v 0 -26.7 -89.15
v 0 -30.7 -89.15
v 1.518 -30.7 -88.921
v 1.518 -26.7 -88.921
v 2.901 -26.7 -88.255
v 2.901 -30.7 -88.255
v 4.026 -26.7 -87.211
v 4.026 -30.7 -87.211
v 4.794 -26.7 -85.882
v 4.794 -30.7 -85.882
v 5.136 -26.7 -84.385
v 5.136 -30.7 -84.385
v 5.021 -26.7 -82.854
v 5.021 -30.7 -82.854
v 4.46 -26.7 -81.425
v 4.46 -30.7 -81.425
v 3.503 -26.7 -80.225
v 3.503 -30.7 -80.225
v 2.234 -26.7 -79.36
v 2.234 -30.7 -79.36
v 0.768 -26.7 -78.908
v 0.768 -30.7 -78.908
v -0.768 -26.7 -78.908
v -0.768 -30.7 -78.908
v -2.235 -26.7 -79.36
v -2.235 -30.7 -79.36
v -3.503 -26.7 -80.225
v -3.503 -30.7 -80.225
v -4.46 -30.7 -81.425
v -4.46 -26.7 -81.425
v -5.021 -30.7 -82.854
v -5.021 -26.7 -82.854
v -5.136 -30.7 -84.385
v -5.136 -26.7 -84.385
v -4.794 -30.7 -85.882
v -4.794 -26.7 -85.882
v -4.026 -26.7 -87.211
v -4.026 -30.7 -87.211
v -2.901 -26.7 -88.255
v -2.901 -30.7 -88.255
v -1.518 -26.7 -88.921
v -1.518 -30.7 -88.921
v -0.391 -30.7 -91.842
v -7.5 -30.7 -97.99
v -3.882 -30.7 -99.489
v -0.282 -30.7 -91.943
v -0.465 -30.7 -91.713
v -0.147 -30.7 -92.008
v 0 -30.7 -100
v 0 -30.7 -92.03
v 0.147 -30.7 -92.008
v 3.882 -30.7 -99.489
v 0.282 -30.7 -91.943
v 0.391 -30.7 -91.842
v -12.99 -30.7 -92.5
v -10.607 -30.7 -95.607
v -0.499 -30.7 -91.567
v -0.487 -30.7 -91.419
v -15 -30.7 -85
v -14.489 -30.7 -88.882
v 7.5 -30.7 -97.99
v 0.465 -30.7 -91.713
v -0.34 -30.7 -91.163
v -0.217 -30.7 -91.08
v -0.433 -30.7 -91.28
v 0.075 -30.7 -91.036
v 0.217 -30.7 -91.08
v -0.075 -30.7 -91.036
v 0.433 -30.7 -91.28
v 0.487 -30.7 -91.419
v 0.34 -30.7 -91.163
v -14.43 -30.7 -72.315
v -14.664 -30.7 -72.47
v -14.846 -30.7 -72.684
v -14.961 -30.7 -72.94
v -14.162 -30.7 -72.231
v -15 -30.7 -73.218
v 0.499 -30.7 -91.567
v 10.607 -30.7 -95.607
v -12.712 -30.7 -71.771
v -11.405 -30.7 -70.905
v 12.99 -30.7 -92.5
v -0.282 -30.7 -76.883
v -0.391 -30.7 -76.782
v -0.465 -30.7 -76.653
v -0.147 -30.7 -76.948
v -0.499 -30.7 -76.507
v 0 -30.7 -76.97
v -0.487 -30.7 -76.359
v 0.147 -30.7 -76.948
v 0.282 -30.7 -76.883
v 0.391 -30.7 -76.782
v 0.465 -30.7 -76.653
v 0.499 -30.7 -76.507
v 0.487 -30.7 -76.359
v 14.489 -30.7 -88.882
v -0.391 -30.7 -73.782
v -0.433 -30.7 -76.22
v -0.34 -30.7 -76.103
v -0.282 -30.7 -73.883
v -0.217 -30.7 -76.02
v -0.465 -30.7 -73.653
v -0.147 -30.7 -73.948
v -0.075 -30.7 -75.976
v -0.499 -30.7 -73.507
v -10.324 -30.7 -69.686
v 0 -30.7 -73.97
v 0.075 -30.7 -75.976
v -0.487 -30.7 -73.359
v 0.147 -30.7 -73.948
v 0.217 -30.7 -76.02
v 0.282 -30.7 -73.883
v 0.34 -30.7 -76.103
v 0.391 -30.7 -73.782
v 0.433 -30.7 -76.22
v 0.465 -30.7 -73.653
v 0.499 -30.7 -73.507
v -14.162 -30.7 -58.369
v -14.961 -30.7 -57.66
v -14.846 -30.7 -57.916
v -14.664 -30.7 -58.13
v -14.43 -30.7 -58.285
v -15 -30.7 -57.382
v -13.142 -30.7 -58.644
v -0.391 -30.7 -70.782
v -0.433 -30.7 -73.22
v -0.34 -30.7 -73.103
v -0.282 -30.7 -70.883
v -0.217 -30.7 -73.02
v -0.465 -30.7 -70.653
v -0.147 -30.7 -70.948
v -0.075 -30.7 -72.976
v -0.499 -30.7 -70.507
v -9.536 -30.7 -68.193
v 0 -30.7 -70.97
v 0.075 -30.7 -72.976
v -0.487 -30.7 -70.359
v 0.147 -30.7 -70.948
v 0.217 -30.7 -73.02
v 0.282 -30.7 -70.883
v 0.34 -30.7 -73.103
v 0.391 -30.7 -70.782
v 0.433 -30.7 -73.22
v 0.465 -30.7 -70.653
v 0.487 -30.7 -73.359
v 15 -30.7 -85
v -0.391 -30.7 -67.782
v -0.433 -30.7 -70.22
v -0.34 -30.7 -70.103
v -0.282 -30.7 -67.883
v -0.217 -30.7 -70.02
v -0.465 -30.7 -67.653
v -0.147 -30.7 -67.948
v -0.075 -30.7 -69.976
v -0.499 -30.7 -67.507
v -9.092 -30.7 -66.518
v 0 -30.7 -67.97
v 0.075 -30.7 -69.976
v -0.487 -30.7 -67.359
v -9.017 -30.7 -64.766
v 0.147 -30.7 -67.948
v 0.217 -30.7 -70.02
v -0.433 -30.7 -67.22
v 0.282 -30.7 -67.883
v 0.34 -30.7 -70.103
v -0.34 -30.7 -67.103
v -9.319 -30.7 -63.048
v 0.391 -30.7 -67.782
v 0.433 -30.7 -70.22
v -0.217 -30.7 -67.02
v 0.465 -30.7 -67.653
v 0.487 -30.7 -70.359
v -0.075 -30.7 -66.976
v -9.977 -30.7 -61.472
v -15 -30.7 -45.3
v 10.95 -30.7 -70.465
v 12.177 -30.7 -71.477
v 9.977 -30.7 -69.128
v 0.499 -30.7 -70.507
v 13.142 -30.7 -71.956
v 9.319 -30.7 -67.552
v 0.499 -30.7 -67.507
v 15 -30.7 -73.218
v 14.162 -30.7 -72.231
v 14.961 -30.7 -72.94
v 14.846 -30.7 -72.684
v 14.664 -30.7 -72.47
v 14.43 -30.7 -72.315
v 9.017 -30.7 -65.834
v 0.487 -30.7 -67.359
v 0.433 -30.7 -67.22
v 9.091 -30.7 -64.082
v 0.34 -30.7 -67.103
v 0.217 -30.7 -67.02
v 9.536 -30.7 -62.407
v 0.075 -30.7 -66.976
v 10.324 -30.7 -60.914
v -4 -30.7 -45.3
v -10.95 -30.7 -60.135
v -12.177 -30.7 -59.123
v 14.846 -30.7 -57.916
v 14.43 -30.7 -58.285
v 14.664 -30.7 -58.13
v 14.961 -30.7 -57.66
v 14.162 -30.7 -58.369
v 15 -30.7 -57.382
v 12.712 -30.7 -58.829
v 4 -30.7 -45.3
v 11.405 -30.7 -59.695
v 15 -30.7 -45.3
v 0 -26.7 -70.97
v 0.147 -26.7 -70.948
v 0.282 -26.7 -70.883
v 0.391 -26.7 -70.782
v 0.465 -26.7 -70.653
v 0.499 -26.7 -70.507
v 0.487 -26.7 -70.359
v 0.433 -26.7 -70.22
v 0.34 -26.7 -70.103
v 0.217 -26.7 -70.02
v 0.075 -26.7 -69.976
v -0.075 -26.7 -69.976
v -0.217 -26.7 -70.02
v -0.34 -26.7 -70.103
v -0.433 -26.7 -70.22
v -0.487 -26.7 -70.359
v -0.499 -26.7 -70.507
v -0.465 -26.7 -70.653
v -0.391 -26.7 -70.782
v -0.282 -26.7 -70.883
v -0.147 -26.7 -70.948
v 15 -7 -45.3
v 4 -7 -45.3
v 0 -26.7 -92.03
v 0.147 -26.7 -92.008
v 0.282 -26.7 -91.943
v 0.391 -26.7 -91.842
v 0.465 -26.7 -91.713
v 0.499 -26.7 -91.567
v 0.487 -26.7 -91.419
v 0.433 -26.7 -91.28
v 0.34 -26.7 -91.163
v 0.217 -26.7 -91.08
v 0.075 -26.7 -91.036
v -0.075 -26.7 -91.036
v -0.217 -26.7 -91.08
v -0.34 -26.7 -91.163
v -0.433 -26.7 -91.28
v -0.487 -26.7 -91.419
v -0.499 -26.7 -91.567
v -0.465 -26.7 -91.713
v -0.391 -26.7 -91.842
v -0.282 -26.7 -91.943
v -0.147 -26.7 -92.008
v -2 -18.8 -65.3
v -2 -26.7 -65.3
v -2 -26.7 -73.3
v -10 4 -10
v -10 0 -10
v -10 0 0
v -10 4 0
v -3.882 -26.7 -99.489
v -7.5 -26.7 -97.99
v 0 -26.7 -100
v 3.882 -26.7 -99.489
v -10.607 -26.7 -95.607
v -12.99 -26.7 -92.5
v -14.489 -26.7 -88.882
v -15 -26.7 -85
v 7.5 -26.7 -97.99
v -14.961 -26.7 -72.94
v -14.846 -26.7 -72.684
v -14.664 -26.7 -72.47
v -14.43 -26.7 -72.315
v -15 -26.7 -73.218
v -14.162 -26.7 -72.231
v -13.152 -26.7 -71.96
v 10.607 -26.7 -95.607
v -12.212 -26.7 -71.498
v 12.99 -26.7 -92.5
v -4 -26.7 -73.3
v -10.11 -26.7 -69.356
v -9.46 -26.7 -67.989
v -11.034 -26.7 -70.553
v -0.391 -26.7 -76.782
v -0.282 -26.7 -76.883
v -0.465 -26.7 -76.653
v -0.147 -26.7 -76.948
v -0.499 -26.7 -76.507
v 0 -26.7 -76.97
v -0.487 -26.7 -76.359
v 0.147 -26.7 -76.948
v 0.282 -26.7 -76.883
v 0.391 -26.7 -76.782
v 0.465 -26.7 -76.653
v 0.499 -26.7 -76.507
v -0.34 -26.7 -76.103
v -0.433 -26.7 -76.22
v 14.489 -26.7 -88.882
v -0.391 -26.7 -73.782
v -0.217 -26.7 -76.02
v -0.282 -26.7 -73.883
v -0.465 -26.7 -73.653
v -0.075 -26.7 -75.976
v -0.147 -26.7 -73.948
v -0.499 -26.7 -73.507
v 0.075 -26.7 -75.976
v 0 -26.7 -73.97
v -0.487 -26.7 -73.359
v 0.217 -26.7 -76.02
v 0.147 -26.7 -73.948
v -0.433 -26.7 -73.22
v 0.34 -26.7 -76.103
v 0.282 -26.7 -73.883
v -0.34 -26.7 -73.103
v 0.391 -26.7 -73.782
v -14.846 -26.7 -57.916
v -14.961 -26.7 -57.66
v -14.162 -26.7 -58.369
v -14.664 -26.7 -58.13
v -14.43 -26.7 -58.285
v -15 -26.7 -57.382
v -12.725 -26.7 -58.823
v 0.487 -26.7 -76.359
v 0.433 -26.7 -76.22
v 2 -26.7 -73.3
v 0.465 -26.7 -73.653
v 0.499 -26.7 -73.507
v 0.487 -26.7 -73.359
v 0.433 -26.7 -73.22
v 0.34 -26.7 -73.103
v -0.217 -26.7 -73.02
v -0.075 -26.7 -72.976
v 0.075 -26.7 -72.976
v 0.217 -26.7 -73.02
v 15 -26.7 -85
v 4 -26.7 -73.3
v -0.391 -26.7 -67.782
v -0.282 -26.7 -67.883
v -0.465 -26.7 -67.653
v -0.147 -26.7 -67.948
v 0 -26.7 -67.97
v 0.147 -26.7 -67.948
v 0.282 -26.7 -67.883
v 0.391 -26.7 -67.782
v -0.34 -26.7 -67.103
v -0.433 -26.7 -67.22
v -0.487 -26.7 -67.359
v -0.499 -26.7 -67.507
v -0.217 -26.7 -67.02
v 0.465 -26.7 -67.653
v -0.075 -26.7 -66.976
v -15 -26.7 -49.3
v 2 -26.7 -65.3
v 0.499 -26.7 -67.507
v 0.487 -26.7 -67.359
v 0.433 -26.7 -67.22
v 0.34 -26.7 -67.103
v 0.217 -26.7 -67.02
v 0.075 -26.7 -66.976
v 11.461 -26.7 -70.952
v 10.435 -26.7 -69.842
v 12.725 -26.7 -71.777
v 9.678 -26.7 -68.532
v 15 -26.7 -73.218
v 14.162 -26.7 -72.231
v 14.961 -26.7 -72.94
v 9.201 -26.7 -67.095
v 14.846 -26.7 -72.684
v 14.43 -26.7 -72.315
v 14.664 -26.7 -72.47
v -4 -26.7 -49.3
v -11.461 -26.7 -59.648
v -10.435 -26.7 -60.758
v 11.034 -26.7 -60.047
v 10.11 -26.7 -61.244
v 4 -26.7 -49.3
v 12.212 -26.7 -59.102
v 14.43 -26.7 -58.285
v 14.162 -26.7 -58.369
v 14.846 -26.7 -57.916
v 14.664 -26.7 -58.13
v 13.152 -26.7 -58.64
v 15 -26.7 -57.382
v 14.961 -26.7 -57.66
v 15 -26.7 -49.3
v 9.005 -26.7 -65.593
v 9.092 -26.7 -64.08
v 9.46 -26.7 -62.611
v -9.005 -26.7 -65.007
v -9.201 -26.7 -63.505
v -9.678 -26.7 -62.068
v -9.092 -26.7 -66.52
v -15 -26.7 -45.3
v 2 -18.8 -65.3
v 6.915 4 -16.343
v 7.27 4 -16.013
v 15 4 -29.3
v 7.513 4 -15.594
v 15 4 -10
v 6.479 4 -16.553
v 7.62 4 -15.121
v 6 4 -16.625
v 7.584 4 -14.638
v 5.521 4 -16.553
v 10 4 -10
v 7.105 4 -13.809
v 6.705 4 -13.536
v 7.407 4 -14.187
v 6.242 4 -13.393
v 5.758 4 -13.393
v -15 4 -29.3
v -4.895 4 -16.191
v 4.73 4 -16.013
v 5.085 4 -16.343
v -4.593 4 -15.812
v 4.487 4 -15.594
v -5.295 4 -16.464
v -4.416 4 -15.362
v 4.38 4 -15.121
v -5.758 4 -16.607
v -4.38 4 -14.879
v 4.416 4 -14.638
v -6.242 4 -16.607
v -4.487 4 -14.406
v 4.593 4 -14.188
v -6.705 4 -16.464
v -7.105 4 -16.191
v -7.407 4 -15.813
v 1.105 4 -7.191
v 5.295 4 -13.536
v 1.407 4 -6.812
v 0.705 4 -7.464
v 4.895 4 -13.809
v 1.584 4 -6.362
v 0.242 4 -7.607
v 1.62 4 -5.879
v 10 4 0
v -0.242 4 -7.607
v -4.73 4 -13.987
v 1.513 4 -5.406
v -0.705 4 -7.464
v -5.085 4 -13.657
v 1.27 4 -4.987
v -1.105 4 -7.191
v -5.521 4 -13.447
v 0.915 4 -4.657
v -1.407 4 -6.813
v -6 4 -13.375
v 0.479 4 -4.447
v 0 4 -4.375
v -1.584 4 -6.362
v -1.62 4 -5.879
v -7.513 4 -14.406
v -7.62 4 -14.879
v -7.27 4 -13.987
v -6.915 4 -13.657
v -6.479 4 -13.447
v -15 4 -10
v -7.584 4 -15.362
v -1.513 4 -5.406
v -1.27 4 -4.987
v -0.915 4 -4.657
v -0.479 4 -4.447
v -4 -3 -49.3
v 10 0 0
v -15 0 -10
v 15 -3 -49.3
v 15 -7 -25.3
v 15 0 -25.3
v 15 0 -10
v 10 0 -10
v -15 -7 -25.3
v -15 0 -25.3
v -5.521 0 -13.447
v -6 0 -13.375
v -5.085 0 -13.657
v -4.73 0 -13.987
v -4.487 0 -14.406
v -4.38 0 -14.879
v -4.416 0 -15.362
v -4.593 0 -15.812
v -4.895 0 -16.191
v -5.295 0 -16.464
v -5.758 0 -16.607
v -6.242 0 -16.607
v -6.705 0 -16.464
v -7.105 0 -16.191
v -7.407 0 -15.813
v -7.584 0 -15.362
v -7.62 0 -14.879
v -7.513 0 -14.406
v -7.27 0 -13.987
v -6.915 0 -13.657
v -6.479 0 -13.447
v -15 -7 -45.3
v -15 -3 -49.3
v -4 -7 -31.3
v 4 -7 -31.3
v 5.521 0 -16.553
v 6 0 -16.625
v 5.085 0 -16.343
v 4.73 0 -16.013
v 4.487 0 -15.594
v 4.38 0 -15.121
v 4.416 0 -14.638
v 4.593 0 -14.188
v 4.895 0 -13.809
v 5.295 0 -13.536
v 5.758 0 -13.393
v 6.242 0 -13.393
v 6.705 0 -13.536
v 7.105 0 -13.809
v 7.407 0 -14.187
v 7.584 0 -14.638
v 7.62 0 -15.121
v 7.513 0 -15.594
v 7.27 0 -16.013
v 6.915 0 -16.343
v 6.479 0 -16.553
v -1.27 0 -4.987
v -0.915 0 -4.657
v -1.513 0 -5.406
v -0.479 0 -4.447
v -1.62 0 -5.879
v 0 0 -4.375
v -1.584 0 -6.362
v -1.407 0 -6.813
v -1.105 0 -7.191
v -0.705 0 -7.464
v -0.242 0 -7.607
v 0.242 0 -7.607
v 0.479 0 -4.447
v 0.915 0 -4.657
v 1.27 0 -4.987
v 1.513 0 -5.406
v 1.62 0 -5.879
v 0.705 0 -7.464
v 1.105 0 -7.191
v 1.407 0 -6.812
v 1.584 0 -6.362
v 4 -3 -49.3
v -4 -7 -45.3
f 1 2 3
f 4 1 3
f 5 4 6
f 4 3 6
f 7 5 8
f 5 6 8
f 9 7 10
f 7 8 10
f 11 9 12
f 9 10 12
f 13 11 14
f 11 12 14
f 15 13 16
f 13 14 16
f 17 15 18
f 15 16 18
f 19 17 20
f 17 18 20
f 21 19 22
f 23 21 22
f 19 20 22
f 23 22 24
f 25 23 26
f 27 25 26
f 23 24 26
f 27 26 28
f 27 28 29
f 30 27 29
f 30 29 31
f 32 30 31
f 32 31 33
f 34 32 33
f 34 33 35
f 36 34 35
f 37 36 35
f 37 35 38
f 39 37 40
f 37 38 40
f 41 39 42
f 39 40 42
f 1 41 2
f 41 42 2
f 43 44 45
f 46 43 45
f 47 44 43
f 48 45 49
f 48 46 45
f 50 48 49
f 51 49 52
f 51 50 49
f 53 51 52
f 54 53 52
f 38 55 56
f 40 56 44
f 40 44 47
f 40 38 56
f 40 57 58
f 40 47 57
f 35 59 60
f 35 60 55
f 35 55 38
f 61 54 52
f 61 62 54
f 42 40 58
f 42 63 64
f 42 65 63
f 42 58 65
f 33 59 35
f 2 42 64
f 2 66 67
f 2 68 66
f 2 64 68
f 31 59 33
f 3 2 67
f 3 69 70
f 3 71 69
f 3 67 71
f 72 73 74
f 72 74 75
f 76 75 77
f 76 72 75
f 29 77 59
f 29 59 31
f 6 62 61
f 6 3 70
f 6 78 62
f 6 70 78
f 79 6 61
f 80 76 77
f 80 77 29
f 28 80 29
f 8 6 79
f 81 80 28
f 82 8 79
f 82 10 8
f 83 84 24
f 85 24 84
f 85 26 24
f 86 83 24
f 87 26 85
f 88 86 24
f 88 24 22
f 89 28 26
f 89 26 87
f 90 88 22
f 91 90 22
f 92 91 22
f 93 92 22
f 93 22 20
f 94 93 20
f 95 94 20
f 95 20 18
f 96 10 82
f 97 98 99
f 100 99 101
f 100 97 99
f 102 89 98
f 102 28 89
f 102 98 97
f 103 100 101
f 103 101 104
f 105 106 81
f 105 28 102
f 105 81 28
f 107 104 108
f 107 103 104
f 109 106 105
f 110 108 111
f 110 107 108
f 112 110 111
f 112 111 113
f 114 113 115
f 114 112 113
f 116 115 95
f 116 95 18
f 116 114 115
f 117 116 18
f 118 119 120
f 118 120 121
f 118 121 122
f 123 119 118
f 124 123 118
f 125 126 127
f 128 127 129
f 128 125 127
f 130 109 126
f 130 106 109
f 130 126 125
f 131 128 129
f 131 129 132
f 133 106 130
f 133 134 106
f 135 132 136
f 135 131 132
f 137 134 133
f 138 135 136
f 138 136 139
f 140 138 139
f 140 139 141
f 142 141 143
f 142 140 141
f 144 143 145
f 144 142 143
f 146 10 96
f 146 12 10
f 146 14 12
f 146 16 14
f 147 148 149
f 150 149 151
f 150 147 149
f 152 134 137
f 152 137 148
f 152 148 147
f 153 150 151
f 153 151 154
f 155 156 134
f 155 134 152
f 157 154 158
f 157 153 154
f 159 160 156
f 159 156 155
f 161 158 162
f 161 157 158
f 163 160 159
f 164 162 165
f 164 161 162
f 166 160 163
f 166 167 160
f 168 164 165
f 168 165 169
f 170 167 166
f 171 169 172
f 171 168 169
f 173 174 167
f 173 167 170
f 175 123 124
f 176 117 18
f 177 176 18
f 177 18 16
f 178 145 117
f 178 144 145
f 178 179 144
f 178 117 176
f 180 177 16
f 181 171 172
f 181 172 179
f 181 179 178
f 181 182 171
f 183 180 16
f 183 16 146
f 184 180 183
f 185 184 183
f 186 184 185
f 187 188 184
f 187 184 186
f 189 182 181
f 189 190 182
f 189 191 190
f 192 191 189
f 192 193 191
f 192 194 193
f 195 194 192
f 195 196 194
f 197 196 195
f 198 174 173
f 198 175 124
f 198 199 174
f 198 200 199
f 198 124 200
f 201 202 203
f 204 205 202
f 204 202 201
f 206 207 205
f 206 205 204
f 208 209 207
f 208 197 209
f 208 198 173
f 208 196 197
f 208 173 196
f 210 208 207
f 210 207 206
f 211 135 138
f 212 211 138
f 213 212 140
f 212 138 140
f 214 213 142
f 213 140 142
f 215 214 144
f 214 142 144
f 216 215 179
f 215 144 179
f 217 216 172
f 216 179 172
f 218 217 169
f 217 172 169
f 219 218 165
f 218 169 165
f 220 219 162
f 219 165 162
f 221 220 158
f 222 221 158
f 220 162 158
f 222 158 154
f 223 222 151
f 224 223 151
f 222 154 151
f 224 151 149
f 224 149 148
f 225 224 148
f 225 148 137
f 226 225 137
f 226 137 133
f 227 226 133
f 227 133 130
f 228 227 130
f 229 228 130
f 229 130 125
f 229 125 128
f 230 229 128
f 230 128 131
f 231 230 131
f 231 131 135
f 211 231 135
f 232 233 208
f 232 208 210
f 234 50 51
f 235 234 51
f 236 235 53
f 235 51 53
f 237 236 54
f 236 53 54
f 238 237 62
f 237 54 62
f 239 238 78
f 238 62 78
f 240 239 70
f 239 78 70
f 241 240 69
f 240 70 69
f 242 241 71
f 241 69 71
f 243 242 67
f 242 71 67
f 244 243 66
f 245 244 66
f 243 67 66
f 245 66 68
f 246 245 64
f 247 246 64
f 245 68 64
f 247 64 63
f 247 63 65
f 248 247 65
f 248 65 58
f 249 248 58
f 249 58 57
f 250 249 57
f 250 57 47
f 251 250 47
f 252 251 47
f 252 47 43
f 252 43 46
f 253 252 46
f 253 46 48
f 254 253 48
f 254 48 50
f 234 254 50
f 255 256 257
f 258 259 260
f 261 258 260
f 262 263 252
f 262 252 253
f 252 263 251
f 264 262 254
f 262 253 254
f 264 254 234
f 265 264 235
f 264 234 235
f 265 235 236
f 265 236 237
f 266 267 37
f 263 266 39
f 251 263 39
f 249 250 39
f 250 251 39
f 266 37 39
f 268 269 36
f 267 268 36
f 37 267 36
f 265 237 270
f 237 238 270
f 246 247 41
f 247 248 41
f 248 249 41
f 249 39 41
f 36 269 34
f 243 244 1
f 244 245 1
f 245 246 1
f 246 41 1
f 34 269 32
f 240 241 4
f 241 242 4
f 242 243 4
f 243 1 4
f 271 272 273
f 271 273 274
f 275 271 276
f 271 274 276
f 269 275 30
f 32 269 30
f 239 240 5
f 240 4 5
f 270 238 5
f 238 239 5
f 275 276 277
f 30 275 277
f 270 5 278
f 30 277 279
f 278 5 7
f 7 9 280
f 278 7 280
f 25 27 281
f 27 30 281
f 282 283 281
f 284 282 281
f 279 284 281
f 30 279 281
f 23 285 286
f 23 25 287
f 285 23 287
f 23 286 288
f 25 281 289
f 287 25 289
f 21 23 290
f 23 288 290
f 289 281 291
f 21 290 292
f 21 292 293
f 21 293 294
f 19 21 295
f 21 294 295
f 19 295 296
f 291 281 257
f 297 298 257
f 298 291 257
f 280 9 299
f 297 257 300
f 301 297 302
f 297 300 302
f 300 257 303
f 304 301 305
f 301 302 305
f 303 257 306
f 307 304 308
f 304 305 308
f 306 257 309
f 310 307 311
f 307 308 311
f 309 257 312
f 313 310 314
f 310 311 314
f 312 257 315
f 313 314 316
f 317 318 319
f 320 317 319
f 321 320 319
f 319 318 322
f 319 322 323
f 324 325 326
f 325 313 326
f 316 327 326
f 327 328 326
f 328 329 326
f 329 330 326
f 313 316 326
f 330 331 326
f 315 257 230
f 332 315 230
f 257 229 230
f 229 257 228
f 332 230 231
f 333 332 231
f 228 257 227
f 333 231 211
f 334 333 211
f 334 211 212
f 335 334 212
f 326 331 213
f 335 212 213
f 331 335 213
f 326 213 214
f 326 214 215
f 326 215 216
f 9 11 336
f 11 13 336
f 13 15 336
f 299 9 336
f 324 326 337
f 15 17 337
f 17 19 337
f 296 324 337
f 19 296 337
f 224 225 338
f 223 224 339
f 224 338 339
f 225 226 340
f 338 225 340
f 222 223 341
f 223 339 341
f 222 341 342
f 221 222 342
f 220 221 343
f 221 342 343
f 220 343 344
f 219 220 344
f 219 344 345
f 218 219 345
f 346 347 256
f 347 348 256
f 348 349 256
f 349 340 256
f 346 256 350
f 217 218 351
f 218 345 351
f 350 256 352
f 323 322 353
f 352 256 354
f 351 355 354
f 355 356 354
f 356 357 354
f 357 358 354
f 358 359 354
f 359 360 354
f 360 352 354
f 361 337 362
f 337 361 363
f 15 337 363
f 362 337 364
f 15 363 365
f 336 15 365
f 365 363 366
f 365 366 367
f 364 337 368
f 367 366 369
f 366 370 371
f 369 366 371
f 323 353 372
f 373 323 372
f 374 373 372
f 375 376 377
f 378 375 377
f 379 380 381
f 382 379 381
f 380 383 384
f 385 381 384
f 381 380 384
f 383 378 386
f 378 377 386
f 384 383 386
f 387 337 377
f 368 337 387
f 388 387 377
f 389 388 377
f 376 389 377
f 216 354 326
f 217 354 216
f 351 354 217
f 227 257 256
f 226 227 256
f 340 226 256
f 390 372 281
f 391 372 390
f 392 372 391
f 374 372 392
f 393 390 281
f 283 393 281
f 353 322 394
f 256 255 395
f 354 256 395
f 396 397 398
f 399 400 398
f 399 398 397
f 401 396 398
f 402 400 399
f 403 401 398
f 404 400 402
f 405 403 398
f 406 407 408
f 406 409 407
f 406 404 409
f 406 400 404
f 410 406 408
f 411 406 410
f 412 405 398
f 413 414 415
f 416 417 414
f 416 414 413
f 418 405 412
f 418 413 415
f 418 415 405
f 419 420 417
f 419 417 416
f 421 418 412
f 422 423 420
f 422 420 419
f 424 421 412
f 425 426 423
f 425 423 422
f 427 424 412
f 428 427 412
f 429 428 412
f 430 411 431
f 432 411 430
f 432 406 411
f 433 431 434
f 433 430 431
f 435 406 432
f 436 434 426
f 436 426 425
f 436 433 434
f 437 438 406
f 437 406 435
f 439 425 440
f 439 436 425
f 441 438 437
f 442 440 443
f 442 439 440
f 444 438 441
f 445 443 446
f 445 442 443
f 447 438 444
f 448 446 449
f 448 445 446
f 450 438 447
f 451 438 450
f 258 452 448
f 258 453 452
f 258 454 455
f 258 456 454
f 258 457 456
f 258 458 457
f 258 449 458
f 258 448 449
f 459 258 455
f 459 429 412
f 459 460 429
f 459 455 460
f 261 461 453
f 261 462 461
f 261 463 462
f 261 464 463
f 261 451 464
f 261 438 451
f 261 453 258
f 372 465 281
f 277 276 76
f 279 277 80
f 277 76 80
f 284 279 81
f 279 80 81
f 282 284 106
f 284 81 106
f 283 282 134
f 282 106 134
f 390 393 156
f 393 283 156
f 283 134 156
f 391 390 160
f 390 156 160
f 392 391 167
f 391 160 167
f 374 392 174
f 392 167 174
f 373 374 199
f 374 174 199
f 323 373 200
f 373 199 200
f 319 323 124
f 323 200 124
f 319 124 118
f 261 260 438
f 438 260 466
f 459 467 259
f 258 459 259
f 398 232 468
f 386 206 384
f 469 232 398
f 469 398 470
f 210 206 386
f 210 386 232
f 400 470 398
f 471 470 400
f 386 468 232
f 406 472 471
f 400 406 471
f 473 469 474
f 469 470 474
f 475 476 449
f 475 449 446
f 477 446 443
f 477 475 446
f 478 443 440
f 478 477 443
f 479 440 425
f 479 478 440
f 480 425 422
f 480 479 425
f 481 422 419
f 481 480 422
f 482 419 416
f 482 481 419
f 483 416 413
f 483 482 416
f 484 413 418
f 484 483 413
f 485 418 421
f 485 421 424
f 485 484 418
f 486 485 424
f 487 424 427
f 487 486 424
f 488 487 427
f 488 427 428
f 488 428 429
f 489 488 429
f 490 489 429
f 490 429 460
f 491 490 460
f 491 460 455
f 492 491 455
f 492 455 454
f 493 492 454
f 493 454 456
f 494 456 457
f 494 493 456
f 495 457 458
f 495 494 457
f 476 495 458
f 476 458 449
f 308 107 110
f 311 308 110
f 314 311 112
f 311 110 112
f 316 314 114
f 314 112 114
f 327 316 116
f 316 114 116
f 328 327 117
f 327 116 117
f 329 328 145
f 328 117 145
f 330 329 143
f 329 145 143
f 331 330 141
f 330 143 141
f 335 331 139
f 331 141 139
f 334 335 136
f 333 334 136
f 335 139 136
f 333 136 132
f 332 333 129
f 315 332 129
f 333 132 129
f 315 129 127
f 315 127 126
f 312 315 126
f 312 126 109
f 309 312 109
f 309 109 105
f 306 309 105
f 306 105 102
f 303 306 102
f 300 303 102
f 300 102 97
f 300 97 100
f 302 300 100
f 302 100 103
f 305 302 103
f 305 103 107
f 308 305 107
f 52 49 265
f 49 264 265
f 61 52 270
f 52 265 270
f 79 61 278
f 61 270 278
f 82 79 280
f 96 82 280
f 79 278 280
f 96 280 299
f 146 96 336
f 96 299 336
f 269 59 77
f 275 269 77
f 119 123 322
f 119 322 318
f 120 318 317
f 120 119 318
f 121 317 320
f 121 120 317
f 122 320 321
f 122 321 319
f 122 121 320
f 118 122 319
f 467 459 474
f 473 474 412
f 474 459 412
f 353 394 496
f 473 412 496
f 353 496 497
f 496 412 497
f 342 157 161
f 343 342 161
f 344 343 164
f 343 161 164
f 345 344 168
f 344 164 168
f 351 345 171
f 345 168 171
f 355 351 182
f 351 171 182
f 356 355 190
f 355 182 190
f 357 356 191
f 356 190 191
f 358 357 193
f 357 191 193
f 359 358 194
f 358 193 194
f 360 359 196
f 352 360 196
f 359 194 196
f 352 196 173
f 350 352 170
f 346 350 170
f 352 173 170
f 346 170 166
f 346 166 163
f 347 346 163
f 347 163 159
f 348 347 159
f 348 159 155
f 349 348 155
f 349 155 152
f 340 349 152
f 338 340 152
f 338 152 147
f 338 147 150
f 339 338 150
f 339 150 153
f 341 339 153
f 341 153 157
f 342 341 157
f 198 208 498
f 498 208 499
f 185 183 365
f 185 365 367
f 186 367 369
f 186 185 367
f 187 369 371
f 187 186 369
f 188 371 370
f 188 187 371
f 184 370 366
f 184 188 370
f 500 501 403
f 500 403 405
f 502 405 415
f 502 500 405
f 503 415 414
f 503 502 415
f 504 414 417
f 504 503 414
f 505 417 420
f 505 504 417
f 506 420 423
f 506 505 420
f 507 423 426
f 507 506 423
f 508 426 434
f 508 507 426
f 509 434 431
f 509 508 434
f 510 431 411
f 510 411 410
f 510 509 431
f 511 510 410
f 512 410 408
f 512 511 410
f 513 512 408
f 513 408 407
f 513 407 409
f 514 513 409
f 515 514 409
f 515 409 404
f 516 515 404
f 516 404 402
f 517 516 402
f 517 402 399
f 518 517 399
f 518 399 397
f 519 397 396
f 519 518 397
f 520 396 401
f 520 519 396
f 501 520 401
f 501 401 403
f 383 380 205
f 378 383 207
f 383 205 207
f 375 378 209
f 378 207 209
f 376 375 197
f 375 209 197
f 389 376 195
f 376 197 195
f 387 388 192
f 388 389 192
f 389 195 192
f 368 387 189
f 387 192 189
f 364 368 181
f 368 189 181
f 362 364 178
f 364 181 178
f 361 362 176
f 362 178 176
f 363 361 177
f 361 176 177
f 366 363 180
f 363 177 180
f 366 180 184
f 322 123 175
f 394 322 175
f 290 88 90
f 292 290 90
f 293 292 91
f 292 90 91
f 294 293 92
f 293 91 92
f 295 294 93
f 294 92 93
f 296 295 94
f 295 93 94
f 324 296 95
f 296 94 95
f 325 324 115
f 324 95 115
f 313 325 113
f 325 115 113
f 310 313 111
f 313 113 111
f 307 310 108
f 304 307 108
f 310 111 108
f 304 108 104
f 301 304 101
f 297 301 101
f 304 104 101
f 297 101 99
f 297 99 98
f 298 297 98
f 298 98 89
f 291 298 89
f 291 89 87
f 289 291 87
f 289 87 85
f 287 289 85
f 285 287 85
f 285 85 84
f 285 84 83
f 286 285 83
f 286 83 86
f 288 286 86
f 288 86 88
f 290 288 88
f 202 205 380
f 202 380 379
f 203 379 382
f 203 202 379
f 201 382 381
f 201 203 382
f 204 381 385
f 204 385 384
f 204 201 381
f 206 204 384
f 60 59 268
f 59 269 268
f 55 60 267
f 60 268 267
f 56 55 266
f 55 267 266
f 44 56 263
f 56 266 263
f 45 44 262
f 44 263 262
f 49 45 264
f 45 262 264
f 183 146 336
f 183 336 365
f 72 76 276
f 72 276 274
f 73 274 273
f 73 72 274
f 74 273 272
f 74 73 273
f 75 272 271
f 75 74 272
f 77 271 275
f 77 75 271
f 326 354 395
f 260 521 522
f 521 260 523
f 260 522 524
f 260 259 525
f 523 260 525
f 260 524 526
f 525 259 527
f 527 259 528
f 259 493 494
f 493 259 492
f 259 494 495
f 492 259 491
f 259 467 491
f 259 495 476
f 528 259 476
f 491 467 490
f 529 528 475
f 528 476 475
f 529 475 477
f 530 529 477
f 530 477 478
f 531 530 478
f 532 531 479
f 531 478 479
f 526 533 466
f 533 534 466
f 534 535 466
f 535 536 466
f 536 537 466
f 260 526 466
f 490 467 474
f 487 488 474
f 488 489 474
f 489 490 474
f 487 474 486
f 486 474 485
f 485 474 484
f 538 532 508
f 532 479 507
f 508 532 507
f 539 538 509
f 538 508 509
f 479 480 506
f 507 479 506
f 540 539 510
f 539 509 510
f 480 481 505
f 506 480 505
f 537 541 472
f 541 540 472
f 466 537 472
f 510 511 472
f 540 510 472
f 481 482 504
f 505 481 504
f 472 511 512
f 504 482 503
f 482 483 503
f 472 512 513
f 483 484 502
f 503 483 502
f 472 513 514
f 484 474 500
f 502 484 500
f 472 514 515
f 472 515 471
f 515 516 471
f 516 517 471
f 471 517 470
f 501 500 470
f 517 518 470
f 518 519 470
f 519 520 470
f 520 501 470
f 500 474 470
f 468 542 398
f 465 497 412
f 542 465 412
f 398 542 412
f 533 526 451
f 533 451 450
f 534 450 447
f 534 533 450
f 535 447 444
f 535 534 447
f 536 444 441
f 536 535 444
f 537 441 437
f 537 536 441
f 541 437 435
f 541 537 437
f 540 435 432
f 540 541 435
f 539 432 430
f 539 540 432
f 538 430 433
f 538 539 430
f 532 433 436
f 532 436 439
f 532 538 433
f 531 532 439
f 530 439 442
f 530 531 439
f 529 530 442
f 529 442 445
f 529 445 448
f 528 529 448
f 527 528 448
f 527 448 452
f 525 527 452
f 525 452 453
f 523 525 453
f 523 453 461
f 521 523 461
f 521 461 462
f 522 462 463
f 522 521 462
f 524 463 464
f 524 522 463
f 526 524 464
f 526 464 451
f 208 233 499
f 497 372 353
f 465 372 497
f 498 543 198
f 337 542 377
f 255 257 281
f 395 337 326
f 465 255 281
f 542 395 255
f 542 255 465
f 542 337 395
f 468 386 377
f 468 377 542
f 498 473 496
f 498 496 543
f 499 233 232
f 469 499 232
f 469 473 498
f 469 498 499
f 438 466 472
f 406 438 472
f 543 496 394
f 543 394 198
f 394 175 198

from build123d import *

# Parameters (mm, degrees)
SKETCH_1_R           = 1.625
EXTRUDE_1_DEPTH      = 4
SKETCH_2_W           = 30
SKETCH_2_H           = 11
EXTRUDE_2_DEPTH      = 4
SKETCH_3_W           = 30
SKETCH_3_H           = 24
EXTRUDE_3_DEPTH      = 4
EXTRUDE_4_DEPTH      = 30
SKETCH_5_W           = 4
SKETCH_5_H           = 23.7
EXTRUDE_5_DEPTH      = 30
SKETCH_6_W           = 30.00005
SKETCH_6_H           = 54.7
SKETCH_6_R           = 5.15
EXTRUDE_6_DEPTH      = 4
CUT_EXTRUDE_1_REACH  = 108.907
SKETCH_8_RX          = 7
SKETCH_8_RY          = 6
FILLET_START         = -32
FILLET_2_DEPTH       = 6
FILLET_3_R           = 15
EXTRUDE_8_DEPTH      = 4
EXTRUDE_8_DEPTH_BACK = 4
EXTRUDE_9_DEPTH      = 4
EXTRUDE_9_DEPTH_BACK = 4
SKETCH_13_R          = 0.5
CUT_EXTRUDE_2_DEPTH  = 20
SKETCH_14_W          = 4
SKETCH_14_H          = 8
CUT_EXTRUDE_3_DEPTH  = 10


with BuildPart() as part:
    # Эскиз1 → Бобышка-Вытянуть1 (new body)
    with BuildSketch(Plane(origin=(0, 0, 0), x_dir=(1, 0, 0), z_dir=(0, 1, 0))):
        Polygon((-10, 0), (10, 0), (10, 10), (15, 10), (15, 25.3), (-15, 25.3), (-15, 10), (-10, 10), align=None)
        with Locations(Location((-6, 15, 0), (0, 0, 270))):
            Circle(SKETCH_1_R, mode=Mode.SUBTRACT)
        with Locations(Location((0, 6, 0), (0, 0, 270))):
            Circle(SKETCH_1_R, mode=Mode.SUBTRACT)
        with Locations(Location((6, 15, 0), (0, 0, 90))):
            Circle(SKETCH_1_R, mode=Mode.SUBTRACT)
    extrude(amount=EXTRUDE_1_DEPTH)

    # Эскиз2 → Бобышка-Вытянуть2 (add)
    with BuildSketch(Plane(origin=(0, 0, -25.3), x_dir=(-1, 0, 0), z_dir=(0, 0, -1))):
        with Locations((0, -1.5)):
            Rectangle(SKETCH_2_W, SKETCH_2_H)
    extrude(amount=EXTRUDE_2_DEPTH)

    # Эскиз3 → Бобышка-Вытянуть3 (add)
    with BuildSketch(Plane.XZ.offset(7)):
        with Locations((0, -37.3)):
            Rectangle(SKETCH_3_W, SKETCH_3_H)
    extrude(amount=-EXTRUDE_3_DEPTH)

    # Эскиз4 → Бобышка-Вытянуть4 (add, through all)
    with BuildSketch(Plane.ZY.offset(15)):
        Polygon((-29.3, 4), (-29.3, -3), (-49.3, -3), align=None)
    extrude(amount=-EXTRUDE_4_DEPTH)

    # Эскиз5 → Бобышка-Вытянуть5 (add, through all)
    with BuildSketch(Plane(origin=(15, 0, 0), x_dir=(0, 0, -1), z_dir=(1, 0, 0))):
        with Locations((47.3, -18.85)):
            Rectangle(SKETCH_5_W, SKETCH_5_H)
    extrude(amount=-EXTRUDE_5_DEPTH)

    # Эскиз6 → Бобышка-Вытянуть6 (add)
    with BuildSketch(Plane.XZ.offset(30.7)):
        with Locations((-2.5e-05, -72.65)):
            Rectangle(SKETCH_6_W, SKETCH_6_H)
        with Locations(Location((-2.5e-05, -84, 0), (0, 0, 270))):
            Circle(SKETCH_6_R, mode=Mode.SUBTRACT)
    extrude(amount=-EXTRUDE_6_DEPTH)

    # Эскиз8 → Вырез-Вытянуть1 (cut, up to next)
    with BuildSketch(Plane.XZ.offset(30.7), mode=Mode.PRIVATE) as cut_extrude_1_sk1:
        with Locations(Location((15, -65.3), (0, 0, -90))):
            Ellipse(SKETCH_8_RX, SKETCH_8_RY)
    cut_extrude_1_tool1 = extrude(cut_extrude_1_sk1.sketch, amount=-CUT_EXTRUDE_1_REACH, mode=Mode.PRIVATE) & part.part
    # Эскиз8 → Вырез-Вытянуть1 (cut, up to next)
    with BuildSketch(Plane.XZ.offset(30.7), mode=Mode.PRIVATE) as cut_extrude_1_sk2:
        with Locations(Location((-15.000018282, -65.299986289), (0, 0, -90.000052373))):
            Ellipse(SKETCH_8_RX, SKETCH_8_RY)
    cut_extrude_1_tool2 = extrude(cut_extrude_1_sk2.sketch, amount=-CUT_EXTRUDE_1_REACH, mode=Mode.PRIVATE) & part.part
    add(cut_extrude_1_tool1.solids().sort_by_distance((15, -30.7, -65.3))[0], mode=Mode.SUBTRACT)
    add(cut_extrude_1_tool2.solids().sort_by_distance((-15.000018, -30.7, -65.299986))[0], mode=Mode.SUBTRACT)

    # Скругление2: read off the stored shape, not the designer's step
    # Скругление2 outline → Скругление2 (cut)
    with BuildSketch(Plane(origin=(0, 0, 0), x_dir=(1, 0, 0), z_dir=(0, 1, 0)).offset(FILLET_START)):
        with BuildLine():
            Line((15, 72.3), (15, 73.218180859))
            ThreePointArc((15, 73.218180859), (14.762336304, 72.570999772), (14.162313281, 72.231441583))
            add(Edge.make_bspline(
                [(14.162313281, 72.231441583), (14.579095458, 72.3), (15, 72.3)],
                knots=[6.131749827, 6.131749827, 6.131749827, 6.283185307, 6.283185307, 6.283185307], degree=2, weights=[0.948970652, 0.971763096, 1]))
        make_face()
        with BuildLine():
            add(Edge.make_bspline(
                [(15, 58.3), (14.579095458, 58.3), (14.162313281, 58.368558417)],
                knots=[3.141592654, 3.141592654, 3.141592654, 3.293028134, 3.293028134, 3.293028134], degree=2, weights=[1, 0.971763096, 0.948970652]))
            ThreePointArc((14.162313281, 58.368558417), (14.762336304, 58.029000228), (15, 57.381819141))
            Line((15, 57.381819141), (15, 58.3))
        make_face()
        with BuildLine():
            add(Edge.make_bspline(
                [(-15.00005, 72.299986289), (-14.579143154, 72.299988746), (-14.162358429, 72.231432015)],
                knots=[6.283181087, 6.283181087, 6.283181087, 6.434617466, 6.434617466, 6.434617466], degree=2, weights=[1, 0.971762843, 0.948970209]))
            ThreePointArc((-14.162358429, 72.231432015), (-14.762384713, 72.570989127), (-15.00005, 73.218172089))
            Line((-15.00005, 73.218172089), (-15.00005, 72.299986289))
        make_face()
        with BuildLine():
            ThreePointArc((-15.00005, 57.381799936), (-14.762384538, 58.028983103), (-14.162357897, 58.368540098))
            add(Edge.make_bspline(
                [(-14.162357897, 58.368540098), (-14.579142884, 58.299983554), (-15.00005, 58.299986289)],
                knots=[9.27334784, 9.27334784, 9.27334784, 9.424784314, 9.424784314, 9.424784314], degree=2, weights=[0.948970181, 0.971762826, 1]))
            Line((-15.00005, 58.299986289), (-15.00005, 57.381799936))
        make_face()
    extrude(amount=FILLET_2_DEPTH, mode=Mode.SUBTRACT)

    # Скругление3
    fillet_3_edges = [part.edges().sort_by_distance(p)[0] for p in [
        (-15.00005, -28.7, -100),
        (15, -28.7, -100),
    ]]
    fillet(fillet_3_edges, radius=FILLET_3_R)

    # Эскиз10 → Бобышка-Вытянуть8 (add, two sides: drawn at the far end of the back side and taken through both)
    with BuildSketch(Plane.ZY.offset(2.5e-05).offset(-EXTRUDE_8_DEPTH_BACK)):
        Polygon((-49.3, -26.7), (-73.3, -26.7), (-49.3, -3), align=None)
    extrude(amount=EXTRUDE_8_DEPTH + EXTRUDE_8_DEPTH_BACK)

    # Эскиз11 → Бобышка-Вытянуть9 (add, two sides: drawn at the far end of the back side and taken through both)
    with BuildSketch(Plane.ZY.offset(2.5e-05).offset(-EXTRUDE_9_DEPTH_BACK)):
        Polygon((-31.3, -7), (-45.3, -7), (-45.3, -30.7), align=None)
    extrude(amount=EXTRUDE_9_DEPTH + EXTRUDE_9_DEPTH_BACK)

    # Эскиз13 → Вырез-Вытянуть2 (cut)
    with BuildSketch(Plane.XZ.offset(30.7)):
        with Locations(Location((-1.0754e-05, -76.47, 0), (0, 0, 270))):
            Circle(SKETCH_13_R)
        with Locations(Location((-1.2125e-05, -73.47, 0), (0, 0, 270))):
            Circle(SKETCH_13_R)
        with Locations(Location((-1.3496e-05, -70.47, 0), (0, 0, 270))):
            Circle(SKETCH_13_R)
        with Locations(Location((-1.4867e-05, -67.47, 0), (0, 0, 270))):
            Circle(SKETCH_13_R)
        with Locations(Location((-3.871e-06, -91.53, 0), (0, 0, 270))):
            Circle(SKETCH_13_R)
    extrude(amount=-CUT_EXTRUDE_2_DEPTH, mode=Mode.SUBTRACT)

    # Эскиз14 → Вырез-Вытянуть3 (cut)
    with BuildSketch(Plane(origin=(0, -26.7, 0), x_dir=(1, 0, 0), z_dir=(0, 1, 0))):
        with Locations((-2.5e-05, 69.3)):
            Rectangle(SKETCH_14_W, SKETCH_14_H)
    extrude(amount=CUT_EXTRUDE_3_DEPTH, mode=Mode.SUBTRACT)


solid = part.part
